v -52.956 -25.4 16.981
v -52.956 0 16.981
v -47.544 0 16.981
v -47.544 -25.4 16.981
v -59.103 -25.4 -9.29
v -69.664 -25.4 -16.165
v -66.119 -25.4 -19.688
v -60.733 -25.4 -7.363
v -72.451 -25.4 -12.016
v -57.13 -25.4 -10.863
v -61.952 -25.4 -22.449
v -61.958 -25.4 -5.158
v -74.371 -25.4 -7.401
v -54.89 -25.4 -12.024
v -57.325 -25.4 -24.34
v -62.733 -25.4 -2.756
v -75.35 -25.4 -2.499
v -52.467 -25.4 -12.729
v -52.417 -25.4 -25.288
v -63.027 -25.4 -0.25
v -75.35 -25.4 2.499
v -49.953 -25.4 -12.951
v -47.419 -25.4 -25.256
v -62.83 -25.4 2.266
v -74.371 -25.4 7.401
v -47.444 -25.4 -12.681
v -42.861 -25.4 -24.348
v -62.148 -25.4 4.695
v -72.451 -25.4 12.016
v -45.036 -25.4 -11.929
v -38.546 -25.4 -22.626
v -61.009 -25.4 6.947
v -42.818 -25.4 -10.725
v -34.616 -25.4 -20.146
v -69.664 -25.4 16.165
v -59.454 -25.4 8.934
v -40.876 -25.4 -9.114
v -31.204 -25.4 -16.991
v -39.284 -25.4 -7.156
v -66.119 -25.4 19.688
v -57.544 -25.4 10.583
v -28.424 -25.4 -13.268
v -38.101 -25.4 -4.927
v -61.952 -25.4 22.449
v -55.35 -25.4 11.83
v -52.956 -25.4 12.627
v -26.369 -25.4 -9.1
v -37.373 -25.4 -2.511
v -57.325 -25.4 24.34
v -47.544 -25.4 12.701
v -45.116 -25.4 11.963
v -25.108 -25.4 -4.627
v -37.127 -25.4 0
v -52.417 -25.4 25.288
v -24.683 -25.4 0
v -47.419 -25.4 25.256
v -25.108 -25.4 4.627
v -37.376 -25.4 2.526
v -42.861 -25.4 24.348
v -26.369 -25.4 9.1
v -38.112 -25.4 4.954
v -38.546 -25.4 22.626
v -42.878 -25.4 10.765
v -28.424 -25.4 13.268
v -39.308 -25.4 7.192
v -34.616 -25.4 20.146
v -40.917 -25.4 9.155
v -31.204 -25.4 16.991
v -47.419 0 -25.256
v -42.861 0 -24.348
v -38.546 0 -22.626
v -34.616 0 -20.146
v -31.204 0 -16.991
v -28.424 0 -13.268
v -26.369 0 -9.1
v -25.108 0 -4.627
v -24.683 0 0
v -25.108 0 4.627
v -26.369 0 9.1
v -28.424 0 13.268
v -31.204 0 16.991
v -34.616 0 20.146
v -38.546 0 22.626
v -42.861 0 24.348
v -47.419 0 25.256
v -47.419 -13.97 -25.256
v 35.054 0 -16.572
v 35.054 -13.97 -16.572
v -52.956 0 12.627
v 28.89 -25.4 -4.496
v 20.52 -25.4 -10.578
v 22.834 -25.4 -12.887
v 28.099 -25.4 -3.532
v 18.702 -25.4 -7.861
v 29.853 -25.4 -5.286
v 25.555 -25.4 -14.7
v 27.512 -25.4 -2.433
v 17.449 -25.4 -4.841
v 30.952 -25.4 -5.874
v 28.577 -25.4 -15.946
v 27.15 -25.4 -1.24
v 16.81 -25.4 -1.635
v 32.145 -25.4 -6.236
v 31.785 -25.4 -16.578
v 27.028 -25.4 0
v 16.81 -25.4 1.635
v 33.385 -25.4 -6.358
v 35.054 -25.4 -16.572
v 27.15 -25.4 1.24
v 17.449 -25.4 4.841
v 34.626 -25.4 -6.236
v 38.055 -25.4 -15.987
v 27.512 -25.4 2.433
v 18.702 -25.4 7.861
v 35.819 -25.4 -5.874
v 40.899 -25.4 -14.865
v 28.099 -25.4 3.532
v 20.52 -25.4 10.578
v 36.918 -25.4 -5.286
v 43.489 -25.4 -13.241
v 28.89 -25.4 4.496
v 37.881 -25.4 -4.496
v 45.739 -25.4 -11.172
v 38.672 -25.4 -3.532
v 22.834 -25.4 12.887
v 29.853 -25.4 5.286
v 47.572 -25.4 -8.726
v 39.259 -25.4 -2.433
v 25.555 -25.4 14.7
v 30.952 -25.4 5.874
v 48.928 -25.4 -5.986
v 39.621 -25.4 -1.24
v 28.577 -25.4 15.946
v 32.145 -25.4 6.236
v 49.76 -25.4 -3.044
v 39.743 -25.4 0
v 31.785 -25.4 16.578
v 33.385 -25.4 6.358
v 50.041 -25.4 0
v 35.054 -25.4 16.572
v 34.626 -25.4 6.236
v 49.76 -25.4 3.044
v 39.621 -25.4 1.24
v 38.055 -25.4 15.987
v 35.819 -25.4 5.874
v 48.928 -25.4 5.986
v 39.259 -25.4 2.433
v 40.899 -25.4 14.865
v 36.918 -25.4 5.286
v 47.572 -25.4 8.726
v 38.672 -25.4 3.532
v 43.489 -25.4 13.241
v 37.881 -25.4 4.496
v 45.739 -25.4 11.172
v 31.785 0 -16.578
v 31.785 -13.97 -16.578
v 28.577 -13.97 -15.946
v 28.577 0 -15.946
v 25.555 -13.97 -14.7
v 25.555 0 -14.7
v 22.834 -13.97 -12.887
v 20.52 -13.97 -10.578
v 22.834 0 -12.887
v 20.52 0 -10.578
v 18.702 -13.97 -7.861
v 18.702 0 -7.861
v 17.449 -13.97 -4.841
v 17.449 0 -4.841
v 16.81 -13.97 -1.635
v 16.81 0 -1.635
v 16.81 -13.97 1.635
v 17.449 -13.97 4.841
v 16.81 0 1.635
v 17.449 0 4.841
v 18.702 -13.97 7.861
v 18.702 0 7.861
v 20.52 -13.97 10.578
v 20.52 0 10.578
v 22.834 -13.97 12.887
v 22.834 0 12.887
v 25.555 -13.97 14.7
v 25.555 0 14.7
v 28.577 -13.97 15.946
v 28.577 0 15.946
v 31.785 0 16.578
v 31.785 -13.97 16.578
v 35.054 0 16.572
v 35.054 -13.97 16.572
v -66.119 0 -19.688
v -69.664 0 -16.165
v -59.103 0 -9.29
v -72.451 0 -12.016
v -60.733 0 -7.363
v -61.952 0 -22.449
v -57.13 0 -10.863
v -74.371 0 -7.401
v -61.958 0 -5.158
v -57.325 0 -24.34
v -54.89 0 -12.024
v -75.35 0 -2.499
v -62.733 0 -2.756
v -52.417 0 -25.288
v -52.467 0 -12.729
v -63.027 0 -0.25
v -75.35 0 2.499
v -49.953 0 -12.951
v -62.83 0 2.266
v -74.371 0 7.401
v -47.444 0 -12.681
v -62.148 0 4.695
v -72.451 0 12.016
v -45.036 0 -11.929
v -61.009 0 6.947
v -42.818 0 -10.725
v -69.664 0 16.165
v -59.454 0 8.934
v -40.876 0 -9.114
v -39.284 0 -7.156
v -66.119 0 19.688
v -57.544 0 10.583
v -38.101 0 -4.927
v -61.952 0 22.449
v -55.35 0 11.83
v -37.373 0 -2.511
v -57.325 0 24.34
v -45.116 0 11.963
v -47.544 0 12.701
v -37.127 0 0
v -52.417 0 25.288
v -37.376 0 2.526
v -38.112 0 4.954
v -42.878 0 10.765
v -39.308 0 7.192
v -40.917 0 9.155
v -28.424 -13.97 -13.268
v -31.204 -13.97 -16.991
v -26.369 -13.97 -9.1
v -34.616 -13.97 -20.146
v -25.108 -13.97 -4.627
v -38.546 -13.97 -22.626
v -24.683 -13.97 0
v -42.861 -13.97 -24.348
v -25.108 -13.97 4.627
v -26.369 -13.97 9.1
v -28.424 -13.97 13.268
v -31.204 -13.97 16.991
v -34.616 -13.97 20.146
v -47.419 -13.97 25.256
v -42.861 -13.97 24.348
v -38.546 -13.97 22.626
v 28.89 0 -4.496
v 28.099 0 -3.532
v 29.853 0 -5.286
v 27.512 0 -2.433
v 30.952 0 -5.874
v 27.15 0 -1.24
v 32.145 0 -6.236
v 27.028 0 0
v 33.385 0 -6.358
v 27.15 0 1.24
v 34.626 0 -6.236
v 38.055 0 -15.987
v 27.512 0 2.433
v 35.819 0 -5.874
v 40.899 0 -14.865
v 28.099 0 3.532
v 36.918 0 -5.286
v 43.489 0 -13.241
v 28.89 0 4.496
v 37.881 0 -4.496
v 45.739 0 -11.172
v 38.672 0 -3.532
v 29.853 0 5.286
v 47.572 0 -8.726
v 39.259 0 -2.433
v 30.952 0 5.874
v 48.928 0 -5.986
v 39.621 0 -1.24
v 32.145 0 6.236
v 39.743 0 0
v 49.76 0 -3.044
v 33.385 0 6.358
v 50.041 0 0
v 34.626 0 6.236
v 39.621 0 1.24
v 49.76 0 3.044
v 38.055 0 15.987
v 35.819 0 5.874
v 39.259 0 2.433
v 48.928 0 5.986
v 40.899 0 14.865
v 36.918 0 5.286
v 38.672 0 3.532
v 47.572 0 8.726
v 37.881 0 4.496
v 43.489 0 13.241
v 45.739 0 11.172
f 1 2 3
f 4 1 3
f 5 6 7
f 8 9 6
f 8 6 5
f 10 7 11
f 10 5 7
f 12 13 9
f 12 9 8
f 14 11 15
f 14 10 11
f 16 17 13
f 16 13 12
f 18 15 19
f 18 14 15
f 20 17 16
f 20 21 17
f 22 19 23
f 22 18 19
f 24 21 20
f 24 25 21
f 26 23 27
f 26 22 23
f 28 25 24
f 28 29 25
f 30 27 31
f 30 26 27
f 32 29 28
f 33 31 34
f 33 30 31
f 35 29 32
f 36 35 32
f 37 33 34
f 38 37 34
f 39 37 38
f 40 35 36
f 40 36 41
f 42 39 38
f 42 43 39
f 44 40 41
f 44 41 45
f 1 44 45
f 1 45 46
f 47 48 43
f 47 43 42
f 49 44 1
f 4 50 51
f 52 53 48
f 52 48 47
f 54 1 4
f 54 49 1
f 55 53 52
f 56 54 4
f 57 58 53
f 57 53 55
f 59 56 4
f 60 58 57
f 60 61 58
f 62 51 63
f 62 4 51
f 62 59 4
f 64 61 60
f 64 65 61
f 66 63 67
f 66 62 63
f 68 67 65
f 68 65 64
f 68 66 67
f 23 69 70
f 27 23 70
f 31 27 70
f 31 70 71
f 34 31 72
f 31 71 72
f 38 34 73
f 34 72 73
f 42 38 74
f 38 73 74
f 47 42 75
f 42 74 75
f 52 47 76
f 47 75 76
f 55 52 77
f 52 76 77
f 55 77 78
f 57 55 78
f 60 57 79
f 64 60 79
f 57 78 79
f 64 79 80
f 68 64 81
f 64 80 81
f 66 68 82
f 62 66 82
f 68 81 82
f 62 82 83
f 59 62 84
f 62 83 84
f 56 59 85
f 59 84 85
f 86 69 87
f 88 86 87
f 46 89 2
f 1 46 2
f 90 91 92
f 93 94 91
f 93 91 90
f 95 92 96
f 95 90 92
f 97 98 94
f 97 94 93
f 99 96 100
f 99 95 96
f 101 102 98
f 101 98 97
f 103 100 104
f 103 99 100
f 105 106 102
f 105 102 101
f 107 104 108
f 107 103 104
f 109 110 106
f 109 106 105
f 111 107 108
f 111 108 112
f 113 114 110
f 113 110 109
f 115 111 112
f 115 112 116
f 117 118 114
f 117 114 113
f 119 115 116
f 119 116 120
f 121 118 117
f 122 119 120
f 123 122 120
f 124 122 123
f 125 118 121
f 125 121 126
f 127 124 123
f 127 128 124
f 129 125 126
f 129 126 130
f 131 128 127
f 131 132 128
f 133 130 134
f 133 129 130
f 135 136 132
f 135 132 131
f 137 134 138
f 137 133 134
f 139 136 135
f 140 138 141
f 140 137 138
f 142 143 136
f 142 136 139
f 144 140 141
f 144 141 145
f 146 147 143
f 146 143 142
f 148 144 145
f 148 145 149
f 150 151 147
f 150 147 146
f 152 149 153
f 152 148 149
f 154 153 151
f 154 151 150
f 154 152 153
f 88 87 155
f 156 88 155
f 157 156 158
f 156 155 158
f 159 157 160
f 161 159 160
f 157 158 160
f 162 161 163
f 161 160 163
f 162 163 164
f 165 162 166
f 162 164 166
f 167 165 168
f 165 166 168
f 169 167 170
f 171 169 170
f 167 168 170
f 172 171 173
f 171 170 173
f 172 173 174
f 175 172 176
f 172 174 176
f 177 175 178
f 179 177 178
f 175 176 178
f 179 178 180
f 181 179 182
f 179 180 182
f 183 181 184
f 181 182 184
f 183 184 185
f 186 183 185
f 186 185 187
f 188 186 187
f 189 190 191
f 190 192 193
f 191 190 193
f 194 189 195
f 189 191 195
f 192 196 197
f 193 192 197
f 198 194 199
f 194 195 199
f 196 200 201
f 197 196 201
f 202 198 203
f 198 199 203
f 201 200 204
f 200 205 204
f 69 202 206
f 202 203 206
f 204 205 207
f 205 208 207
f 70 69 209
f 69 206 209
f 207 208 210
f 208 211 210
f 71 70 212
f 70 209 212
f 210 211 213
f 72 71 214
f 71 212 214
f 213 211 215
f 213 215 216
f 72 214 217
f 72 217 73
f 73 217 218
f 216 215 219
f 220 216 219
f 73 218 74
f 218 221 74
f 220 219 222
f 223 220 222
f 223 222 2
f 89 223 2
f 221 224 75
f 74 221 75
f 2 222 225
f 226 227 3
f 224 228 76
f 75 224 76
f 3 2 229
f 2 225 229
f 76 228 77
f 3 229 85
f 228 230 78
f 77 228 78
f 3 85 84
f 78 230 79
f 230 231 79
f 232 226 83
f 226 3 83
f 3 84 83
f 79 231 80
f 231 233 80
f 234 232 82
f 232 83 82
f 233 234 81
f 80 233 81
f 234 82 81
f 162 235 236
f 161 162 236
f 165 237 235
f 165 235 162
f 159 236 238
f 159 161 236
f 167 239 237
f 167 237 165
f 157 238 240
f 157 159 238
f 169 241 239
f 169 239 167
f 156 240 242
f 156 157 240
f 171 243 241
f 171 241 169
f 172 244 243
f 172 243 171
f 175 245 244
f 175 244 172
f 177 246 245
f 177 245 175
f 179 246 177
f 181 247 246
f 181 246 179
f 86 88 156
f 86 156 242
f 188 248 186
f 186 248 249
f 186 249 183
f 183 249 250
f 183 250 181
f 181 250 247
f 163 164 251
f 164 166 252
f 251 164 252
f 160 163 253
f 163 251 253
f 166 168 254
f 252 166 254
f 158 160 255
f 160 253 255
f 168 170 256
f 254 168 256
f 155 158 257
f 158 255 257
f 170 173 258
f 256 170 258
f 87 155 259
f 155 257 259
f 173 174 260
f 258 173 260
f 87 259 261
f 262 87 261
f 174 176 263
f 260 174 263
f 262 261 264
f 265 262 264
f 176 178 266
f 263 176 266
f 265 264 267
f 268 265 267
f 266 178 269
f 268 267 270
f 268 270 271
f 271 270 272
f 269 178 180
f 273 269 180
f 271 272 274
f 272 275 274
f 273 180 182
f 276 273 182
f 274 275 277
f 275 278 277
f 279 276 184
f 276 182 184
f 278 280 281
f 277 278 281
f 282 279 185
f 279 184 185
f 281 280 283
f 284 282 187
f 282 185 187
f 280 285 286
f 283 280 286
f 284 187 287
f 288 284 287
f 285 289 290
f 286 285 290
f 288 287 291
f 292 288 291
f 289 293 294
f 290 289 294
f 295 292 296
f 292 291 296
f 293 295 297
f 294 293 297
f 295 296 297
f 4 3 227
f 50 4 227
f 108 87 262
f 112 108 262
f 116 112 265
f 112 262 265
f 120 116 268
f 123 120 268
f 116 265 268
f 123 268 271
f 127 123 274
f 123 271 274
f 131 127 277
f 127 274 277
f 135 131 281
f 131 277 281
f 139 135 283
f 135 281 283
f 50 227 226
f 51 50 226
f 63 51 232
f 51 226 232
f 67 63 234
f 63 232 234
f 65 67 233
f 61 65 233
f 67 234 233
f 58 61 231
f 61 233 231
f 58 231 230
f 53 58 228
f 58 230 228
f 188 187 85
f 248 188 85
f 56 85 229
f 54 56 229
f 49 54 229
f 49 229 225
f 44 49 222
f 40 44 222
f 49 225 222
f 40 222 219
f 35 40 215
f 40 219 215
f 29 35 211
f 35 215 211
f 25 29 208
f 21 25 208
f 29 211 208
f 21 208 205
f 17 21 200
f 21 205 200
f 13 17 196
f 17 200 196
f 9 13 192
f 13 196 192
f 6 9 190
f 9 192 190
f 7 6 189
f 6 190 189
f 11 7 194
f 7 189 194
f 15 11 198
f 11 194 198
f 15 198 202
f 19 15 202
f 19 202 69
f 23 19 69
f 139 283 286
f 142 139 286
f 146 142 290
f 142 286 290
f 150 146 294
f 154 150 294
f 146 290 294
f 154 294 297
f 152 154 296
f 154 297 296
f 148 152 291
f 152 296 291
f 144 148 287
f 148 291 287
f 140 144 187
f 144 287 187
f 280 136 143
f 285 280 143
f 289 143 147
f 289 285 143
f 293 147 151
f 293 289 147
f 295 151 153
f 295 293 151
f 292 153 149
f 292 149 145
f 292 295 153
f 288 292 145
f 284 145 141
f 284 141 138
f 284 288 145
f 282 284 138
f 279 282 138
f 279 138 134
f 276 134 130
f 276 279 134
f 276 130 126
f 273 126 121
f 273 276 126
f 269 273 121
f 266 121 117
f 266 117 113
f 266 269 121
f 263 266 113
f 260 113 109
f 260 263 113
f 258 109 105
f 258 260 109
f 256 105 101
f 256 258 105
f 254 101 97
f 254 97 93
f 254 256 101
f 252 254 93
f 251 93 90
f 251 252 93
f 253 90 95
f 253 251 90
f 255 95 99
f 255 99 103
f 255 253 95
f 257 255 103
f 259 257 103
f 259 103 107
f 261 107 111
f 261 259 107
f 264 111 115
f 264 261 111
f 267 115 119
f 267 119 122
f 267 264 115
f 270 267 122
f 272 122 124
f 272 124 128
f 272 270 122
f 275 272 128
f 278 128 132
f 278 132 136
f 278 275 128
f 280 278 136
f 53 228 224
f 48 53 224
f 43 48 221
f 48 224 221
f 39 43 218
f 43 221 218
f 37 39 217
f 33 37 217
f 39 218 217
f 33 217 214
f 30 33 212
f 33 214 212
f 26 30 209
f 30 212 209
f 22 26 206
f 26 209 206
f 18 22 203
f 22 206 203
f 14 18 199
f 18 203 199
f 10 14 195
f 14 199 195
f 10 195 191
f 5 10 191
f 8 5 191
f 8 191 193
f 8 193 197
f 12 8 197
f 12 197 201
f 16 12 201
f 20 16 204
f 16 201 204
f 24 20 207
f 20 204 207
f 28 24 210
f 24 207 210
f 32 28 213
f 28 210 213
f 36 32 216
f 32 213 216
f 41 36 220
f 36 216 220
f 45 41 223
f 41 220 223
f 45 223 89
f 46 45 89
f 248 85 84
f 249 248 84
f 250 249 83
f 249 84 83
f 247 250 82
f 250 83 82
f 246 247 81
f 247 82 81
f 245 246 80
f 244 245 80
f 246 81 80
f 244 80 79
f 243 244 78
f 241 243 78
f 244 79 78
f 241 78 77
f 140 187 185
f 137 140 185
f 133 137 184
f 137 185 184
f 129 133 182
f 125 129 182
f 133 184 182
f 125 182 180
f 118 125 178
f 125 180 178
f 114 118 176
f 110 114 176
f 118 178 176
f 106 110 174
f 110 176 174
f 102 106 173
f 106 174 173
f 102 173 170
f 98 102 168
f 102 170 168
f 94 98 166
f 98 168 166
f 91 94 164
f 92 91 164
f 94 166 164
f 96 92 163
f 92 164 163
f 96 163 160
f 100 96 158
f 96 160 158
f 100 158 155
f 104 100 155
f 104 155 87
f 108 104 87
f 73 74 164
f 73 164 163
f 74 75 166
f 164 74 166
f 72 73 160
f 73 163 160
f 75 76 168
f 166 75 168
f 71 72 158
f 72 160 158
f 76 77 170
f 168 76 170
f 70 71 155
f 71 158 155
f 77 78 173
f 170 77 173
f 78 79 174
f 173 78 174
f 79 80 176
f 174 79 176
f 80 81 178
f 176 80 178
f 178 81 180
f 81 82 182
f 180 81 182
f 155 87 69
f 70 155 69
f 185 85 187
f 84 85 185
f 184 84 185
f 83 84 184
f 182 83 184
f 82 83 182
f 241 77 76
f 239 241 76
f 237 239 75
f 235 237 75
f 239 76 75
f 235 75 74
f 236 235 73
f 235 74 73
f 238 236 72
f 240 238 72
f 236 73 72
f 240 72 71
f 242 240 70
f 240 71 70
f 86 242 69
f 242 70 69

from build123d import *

# Parameters (mm, degrees)
F1_DEPTH = 25.4
F0_R     = 6.357837
F2_DEPTH = 25.4
F3_DEPTH = 13.97


with BuildPart() as f1:
    # F0 (on Front) → F1 (new body)
    with BuildSketch(Plane.XZ):
        with BuildLine():
            ThreePointArc((-47.418824, -25.255869), (-31.204047, -16.991101), (-24.682706, 0))
            ThreePointArc((-24.682706, 0), (-31.204047, 16.991101), (-47.418824, 25.255869))
            ThreePointArc((-47.418824, 25.255869), (-75.473698, 0), (-47.418824, -25.255869))
        make_face()
        with BuildLine():
            ThreePointArc((-47.543671, 12.700838), (-40.0642, 8.213092), (-37.126943, 0))
            ThreePointArc((-37.126943, 0), (-58.154731, -10.124466), (-52.956261, 12.627427))
            Line((-52.956261, 12.627427), (-52.956261, 16.98054))
            Line((-52.956261, 16.98054), (-47.543671, 16.98054))
            Line((-47.543671, 16.98054), (-47.543671, 12.700838))
        make_face(mode=Mode.SUBTRACT)
    extrude(amount=F1_DEPTH)


with BuildPart() as f2:
    # F0 (on Front) → F2 (new body)
    with BuildSketch(Plane.XZ):
        with BuildLine():
            ThreePointArc((50.040947, 0), (45.738664, 11.17155), (35.054463, 16.571643))
            ThreePointArc((35.054463, 16.571643), (16.729994, 0), (35.054463, -16.571643))
            ThreePointArc((35.054463, -16.571643), (45.738664, -11.17155), (50.040947, 0))
        make_face()
        with Locations((33.385471, 0)):
            Circle(F0_R, mode=Mode.SUBTRACT)
    extrude(amount=F2_DEPTH)


with BuildPart() as f3:
    # F0 (on Front) → F3 (new body)
    with BuildSketch(Plane.XZ):
        with BuildLine():
            ThreePointArc((-47.418824, 25.255869), (-31.204047, 16.991101), (-24.682706, 0))
            ThreePointArc((-24.682706, 0), (-31.204047, -16.991101), (-47.418824, -25.255869))
            Line((-47.418824, -25.255869), (35.054463, -16.571643))
            ThreePointArc((35.054463, -16.571643), (16.729994, 0), (35.054463, 16.571643))
            Line((35.054463, 16.571643), (-47.418824, 25.255869))
        make_face()
    extrude(amount=F3_DEPTH)


solid = Compound([f1.part, f2.part, f3.part])
